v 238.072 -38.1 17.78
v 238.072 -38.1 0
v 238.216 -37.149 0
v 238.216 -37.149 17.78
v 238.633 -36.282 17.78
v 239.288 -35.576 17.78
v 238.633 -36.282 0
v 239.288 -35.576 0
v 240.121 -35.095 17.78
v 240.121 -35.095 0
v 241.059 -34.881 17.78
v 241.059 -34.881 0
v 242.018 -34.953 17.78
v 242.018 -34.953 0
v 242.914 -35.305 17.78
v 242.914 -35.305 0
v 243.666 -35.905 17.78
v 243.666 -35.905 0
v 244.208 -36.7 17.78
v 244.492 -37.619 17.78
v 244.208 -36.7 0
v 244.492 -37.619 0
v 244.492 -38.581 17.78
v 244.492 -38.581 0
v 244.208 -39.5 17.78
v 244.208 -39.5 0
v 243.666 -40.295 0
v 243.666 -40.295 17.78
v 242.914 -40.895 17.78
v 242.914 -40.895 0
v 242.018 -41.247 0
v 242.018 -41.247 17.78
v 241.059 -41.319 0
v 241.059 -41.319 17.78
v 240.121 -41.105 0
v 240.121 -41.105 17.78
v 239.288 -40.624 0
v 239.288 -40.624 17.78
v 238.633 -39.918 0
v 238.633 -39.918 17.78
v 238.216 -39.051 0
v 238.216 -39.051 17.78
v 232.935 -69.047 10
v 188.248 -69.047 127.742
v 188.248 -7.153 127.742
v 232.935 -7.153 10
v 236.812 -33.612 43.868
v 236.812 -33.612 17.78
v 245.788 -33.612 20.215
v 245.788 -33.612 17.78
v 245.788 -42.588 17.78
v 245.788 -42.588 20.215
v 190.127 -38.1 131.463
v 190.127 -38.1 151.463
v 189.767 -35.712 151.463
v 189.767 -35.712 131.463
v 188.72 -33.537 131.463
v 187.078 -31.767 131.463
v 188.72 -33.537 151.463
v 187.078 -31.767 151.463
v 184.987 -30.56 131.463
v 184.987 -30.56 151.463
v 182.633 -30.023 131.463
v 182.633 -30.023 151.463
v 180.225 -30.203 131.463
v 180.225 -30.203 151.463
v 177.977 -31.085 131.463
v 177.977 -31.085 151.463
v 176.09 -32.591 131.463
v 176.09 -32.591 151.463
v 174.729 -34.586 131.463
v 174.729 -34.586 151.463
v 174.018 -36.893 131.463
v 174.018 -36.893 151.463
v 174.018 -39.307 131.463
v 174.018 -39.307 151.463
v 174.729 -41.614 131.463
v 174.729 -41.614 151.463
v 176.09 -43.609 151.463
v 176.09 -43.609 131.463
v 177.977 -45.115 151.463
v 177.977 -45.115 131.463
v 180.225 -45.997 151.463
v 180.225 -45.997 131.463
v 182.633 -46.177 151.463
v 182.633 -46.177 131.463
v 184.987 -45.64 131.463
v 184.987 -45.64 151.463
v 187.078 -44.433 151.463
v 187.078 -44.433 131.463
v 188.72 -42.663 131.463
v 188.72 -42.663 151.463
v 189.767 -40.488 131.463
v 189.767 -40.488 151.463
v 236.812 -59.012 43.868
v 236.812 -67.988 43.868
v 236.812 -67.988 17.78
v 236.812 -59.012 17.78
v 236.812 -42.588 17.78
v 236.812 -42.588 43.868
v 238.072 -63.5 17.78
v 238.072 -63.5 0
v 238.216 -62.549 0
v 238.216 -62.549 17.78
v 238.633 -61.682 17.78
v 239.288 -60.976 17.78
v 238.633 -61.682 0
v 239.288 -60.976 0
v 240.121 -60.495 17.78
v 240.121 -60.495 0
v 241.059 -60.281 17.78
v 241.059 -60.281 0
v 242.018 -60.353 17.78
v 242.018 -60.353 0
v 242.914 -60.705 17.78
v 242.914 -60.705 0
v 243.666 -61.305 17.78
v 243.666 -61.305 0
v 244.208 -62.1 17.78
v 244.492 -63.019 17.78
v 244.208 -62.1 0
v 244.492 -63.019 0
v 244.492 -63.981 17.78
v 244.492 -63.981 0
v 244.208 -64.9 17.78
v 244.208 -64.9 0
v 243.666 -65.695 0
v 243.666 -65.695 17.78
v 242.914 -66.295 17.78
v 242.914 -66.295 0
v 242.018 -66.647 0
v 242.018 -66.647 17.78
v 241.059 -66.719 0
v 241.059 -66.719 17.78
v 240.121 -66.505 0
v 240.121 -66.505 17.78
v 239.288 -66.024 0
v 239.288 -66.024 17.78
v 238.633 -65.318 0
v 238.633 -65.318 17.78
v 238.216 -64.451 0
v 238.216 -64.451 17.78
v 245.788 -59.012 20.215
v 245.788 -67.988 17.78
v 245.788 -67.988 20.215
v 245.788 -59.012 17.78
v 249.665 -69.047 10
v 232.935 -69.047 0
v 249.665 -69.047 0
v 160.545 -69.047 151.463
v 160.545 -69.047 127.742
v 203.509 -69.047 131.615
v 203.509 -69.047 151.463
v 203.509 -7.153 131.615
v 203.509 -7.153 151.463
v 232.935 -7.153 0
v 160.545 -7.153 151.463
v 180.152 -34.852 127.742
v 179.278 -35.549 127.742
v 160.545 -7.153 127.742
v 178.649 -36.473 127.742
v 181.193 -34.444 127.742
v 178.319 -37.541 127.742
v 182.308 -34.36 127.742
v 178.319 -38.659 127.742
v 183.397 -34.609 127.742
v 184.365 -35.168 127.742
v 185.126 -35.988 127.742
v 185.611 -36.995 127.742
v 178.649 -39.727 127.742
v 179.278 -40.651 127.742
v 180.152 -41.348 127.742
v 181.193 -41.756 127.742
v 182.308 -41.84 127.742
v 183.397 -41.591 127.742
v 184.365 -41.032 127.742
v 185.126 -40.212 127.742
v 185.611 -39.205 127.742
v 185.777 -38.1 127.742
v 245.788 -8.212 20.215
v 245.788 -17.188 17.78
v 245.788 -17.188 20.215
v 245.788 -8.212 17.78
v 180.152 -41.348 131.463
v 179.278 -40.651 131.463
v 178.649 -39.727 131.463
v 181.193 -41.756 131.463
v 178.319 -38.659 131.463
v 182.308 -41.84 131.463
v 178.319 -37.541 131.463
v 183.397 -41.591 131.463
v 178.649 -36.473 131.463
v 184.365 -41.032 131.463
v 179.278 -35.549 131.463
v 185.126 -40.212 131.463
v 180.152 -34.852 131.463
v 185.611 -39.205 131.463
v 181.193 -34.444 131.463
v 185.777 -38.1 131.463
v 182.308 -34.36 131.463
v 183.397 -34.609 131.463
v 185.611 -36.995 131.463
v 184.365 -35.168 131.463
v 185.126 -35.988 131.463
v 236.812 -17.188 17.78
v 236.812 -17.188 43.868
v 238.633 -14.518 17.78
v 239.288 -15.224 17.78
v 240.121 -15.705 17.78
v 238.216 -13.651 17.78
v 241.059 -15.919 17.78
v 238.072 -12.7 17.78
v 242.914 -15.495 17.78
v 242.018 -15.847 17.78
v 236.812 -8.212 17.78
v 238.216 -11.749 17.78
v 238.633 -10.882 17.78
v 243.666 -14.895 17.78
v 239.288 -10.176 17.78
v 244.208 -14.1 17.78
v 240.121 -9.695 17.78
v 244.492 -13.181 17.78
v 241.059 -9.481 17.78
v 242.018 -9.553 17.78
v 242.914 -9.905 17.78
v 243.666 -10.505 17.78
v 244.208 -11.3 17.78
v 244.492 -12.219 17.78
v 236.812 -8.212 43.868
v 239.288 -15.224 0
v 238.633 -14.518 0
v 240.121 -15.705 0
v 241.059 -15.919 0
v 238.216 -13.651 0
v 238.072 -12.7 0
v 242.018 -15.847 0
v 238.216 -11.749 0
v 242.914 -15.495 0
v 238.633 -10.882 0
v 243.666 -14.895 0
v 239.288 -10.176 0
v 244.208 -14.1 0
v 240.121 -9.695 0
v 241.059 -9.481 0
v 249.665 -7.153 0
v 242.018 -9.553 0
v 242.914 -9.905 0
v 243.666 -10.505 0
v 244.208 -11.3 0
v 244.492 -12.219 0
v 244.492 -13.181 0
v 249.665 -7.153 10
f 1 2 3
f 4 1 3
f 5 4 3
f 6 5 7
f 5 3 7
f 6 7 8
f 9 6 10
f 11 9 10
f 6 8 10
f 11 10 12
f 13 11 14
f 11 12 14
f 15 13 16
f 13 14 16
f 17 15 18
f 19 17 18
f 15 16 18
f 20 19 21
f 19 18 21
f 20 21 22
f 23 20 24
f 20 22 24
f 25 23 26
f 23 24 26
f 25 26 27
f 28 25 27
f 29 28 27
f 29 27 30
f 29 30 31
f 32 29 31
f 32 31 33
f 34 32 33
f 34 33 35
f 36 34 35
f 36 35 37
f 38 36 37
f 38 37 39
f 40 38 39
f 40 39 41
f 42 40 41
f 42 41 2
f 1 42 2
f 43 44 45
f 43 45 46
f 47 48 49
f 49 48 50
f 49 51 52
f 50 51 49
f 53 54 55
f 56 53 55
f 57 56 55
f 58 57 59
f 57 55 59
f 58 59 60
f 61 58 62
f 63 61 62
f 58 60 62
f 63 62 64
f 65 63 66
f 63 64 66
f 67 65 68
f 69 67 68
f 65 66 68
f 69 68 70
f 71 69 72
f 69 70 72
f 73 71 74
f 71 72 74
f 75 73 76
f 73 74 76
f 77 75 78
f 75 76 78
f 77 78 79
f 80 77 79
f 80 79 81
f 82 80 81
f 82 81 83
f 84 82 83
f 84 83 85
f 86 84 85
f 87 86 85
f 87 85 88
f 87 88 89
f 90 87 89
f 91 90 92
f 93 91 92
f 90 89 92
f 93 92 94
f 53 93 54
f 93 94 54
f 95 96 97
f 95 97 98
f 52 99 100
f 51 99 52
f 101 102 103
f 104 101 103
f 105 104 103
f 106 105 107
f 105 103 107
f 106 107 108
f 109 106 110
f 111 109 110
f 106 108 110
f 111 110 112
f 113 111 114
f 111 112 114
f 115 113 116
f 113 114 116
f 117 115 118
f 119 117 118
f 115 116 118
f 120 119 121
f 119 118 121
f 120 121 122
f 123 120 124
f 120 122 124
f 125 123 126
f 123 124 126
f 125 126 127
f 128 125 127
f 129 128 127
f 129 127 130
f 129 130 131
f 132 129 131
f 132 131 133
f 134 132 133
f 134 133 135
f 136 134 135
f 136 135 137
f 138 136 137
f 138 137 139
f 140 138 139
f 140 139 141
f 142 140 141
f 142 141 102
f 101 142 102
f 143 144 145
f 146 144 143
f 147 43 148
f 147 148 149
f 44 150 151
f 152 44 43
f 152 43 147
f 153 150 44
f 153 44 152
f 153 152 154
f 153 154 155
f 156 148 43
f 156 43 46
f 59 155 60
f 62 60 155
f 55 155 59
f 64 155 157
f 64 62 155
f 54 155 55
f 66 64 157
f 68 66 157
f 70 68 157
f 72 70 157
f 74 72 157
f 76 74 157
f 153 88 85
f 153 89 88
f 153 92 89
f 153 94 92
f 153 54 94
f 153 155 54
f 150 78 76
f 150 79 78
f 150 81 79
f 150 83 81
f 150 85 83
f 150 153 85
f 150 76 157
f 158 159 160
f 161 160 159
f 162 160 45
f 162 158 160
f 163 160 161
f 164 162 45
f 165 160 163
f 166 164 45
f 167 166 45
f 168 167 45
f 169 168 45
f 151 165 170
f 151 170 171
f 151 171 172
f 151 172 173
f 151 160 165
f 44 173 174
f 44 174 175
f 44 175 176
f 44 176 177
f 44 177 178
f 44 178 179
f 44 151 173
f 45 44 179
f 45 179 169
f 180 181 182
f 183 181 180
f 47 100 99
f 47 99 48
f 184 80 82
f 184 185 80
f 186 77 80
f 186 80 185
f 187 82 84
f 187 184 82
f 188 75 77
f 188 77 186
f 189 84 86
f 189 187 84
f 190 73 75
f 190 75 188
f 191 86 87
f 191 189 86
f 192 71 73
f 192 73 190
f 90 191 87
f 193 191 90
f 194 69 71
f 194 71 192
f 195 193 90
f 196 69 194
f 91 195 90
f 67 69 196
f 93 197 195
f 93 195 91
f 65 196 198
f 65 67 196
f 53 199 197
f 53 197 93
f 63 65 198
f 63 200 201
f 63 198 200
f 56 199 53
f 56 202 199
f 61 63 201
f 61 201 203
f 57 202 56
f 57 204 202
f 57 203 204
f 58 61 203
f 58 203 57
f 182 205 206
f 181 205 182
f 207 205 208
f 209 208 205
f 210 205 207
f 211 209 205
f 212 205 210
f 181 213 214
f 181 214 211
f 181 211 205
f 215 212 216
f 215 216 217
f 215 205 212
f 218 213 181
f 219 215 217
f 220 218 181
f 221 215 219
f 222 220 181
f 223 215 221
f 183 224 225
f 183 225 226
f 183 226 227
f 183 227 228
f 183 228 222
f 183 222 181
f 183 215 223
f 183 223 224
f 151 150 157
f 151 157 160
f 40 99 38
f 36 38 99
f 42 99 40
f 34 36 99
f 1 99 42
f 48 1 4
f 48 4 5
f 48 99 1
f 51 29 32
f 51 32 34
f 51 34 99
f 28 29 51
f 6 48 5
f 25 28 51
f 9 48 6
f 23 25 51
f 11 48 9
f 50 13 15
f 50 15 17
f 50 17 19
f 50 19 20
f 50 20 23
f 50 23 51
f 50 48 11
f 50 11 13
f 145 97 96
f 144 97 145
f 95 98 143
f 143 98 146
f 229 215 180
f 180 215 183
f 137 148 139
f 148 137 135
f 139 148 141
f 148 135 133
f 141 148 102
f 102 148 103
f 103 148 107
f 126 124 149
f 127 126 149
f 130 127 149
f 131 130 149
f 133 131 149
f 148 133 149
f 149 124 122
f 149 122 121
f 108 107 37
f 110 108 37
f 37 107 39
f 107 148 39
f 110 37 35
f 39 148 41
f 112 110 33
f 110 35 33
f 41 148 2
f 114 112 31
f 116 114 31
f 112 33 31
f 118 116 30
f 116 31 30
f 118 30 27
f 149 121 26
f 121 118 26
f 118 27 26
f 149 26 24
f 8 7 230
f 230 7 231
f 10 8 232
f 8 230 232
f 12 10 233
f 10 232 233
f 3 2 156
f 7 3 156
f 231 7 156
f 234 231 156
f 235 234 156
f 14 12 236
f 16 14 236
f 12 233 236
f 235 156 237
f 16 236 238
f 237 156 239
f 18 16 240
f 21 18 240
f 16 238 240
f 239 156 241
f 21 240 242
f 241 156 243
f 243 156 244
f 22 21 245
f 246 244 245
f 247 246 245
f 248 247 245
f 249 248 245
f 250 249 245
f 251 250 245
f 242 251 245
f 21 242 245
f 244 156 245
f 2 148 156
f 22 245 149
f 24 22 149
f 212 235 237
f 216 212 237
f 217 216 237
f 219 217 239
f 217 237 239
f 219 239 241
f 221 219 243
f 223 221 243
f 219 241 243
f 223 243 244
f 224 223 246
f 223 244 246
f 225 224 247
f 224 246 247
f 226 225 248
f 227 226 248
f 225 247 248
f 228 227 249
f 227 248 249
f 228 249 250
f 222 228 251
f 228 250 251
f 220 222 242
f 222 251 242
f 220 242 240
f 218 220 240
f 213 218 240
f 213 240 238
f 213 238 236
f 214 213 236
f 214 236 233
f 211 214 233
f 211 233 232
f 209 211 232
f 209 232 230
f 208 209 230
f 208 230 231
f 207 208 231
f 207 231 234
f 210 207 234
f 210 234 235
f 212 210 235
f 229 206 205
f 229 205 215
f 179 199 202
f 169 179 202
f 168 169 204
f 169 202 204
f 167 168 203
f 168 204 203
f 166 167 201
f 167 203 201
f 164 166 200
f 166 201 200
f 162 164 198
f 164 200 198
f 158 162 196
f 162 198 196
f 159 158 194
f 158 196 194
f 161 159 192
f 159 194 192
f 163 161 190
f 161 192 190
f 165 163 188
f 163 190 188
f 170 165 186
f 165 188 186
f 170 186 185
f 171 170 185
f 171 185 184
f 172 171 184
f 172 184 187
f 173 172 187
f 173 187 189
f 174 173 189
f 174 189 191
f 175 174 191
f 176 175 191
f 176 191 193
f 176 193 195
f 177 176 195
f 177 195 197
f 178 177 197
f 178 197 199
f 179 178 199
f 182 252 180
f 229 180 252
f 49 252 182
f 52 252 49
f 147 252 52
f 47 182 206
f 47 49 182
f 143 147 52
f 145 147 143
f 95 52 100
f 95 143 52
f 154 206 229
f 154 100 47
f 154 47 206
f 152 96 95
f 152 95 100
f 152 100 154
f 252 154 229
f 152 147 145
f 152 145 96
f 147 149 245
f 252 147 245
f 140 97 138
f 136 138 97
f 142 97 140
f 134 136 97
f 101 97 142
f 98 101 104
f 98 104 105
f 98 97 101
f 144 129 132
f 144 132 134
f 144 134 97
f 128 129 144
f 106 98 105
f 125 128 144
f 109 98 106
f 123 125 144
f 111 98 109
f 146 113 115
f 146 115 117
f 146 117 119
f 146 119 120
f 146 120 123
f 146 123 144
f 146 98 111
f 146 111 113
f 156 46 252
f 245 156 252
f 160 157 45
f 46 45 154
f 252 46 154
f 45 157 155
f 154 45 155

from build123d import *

# Parameters (mm, degrees)
SKETCH4_W           = 16.730770432
SKETCH4_H           = 61.894764582
SKETCH4_R           = 3.048230072
BOSS_EXTRUDE4_DEPTH = 10
BOSS_EXTRUDE5_DEPTH = 61.894764581
SKETCH6_R           = 3.22777379
CUT_EXTRUDE1_DEPTH  = 301.068940686
CUT_EXTRUDE2_START  = 17.78
SKETCH8_W           = 8.976833554
SKETCH8_H           = 8.976833554
CUT_EXTRUDE2_DEPTH  = 30.32
SKETCH9_R           = 3.75
CUT_EXTRUDE3_DEPTH  = 30.32
SKETCH10_R          = 8.1
CUT_EXTRUDE4_DEPTH  = 20


with BuildPart() as part:
    # Sketch4 → Boss-Extrude4 (new body)
    with BuildSketch(Plane.XY):
        with Locations((241.3, -38.1)):
            Rectangle(SKETCH4_W, SKETCH4_H)
        with Locations((241.3, -12.7)):
            Circle(SKETCH4_R, mode=Mode.SUBTRACT)
        with Locations((241.3, -38.1)):
            Circle(SKETCH4_R, mode=Mode.SUBTRACT)
        with Locations((241.3, -63.5)):
            Circle(SKETCH4_R, mode=Mode.SUBTRACT)
    extrude(amount=BOSS_EXTRUDE4_DEPTH)

    # Sketch5 → Boss-Extrude5 (add)
    with BuildSketch(Plane.XZ.offset(69.047382291)):
        Polygon((249.665385216, 10), (203.509422764, 131.615224448), (203.509422764, 151.462944604), (160.545206695, 151.462944604), (160.545206695, 127.74240556), (188.24848215, 127.74240556), (232.934614784, 10), align=None)
    extrude(amount=-BOSS_EXTRUDE5_DEPTH)

    # Sketch6 → Cut-Extrude1 (cut, through all)
    with BuildSketch(Plane(origin=(0, 0, 0), x_dir=(-1, 0, 0), z_dir=(0, 0, -1))):
        with Locations((-241.3, -63.5)):
            Circle(SKETCH6_R)
        with Locations((-241.3, -38.1)):
            Circle(SKETCH6_R)
        with Locations((-241.3, -12.7)):
            Circle(SKETCH6_R)
    extrude(amount=-CUT_EXTRUDE1_DEPTH, mode=Mode.SUBTRACT)

    # Sketch8 → Cut-Extrude2 (cut)
    with BuildSketch(Plane.XY.offset(CUT_EXTRUDE2_START)):
        with Locations((241.3, -63.5)):
            Rectangle(SKETCH8_W, SKETCH8_H)
        with Locations((241.3, -38.1)):
            Rectangle(SKETCH8_W, SKETCH8_H)
        with Locations((241.3, -12.7)):
            Rectangle(SKETCH8_W, SKETCH8_H)
    extrude(amount=CUT_EXTRUDE2_DEPTH, mode=Mode.SUBTRACT)

    # Sketch9 → Cut-Extrude3 (cut)
    with BuildSketch(Plane.XY.offset(151.462944604)):
        with Locations((182.02731473, -38.1)):
            Circle(SKETCH9_R)
    extrude(amount=-CUT_EXTRUDE3_DEPTH, mode=Mode.SUBTRACT)

    # Sketch10 → Cut-Extrude4 (cut)
    with BuildSketch(Plane.XY.offset(151.462944604)):
        with Locations((182.02731473, -38.1)):
            Circle(SKETCH10_R)
    extrude(amount=-CUT_EXTRUDE4_DEPTH, mode=Mode.SUBTRACT)


solid = part.part
